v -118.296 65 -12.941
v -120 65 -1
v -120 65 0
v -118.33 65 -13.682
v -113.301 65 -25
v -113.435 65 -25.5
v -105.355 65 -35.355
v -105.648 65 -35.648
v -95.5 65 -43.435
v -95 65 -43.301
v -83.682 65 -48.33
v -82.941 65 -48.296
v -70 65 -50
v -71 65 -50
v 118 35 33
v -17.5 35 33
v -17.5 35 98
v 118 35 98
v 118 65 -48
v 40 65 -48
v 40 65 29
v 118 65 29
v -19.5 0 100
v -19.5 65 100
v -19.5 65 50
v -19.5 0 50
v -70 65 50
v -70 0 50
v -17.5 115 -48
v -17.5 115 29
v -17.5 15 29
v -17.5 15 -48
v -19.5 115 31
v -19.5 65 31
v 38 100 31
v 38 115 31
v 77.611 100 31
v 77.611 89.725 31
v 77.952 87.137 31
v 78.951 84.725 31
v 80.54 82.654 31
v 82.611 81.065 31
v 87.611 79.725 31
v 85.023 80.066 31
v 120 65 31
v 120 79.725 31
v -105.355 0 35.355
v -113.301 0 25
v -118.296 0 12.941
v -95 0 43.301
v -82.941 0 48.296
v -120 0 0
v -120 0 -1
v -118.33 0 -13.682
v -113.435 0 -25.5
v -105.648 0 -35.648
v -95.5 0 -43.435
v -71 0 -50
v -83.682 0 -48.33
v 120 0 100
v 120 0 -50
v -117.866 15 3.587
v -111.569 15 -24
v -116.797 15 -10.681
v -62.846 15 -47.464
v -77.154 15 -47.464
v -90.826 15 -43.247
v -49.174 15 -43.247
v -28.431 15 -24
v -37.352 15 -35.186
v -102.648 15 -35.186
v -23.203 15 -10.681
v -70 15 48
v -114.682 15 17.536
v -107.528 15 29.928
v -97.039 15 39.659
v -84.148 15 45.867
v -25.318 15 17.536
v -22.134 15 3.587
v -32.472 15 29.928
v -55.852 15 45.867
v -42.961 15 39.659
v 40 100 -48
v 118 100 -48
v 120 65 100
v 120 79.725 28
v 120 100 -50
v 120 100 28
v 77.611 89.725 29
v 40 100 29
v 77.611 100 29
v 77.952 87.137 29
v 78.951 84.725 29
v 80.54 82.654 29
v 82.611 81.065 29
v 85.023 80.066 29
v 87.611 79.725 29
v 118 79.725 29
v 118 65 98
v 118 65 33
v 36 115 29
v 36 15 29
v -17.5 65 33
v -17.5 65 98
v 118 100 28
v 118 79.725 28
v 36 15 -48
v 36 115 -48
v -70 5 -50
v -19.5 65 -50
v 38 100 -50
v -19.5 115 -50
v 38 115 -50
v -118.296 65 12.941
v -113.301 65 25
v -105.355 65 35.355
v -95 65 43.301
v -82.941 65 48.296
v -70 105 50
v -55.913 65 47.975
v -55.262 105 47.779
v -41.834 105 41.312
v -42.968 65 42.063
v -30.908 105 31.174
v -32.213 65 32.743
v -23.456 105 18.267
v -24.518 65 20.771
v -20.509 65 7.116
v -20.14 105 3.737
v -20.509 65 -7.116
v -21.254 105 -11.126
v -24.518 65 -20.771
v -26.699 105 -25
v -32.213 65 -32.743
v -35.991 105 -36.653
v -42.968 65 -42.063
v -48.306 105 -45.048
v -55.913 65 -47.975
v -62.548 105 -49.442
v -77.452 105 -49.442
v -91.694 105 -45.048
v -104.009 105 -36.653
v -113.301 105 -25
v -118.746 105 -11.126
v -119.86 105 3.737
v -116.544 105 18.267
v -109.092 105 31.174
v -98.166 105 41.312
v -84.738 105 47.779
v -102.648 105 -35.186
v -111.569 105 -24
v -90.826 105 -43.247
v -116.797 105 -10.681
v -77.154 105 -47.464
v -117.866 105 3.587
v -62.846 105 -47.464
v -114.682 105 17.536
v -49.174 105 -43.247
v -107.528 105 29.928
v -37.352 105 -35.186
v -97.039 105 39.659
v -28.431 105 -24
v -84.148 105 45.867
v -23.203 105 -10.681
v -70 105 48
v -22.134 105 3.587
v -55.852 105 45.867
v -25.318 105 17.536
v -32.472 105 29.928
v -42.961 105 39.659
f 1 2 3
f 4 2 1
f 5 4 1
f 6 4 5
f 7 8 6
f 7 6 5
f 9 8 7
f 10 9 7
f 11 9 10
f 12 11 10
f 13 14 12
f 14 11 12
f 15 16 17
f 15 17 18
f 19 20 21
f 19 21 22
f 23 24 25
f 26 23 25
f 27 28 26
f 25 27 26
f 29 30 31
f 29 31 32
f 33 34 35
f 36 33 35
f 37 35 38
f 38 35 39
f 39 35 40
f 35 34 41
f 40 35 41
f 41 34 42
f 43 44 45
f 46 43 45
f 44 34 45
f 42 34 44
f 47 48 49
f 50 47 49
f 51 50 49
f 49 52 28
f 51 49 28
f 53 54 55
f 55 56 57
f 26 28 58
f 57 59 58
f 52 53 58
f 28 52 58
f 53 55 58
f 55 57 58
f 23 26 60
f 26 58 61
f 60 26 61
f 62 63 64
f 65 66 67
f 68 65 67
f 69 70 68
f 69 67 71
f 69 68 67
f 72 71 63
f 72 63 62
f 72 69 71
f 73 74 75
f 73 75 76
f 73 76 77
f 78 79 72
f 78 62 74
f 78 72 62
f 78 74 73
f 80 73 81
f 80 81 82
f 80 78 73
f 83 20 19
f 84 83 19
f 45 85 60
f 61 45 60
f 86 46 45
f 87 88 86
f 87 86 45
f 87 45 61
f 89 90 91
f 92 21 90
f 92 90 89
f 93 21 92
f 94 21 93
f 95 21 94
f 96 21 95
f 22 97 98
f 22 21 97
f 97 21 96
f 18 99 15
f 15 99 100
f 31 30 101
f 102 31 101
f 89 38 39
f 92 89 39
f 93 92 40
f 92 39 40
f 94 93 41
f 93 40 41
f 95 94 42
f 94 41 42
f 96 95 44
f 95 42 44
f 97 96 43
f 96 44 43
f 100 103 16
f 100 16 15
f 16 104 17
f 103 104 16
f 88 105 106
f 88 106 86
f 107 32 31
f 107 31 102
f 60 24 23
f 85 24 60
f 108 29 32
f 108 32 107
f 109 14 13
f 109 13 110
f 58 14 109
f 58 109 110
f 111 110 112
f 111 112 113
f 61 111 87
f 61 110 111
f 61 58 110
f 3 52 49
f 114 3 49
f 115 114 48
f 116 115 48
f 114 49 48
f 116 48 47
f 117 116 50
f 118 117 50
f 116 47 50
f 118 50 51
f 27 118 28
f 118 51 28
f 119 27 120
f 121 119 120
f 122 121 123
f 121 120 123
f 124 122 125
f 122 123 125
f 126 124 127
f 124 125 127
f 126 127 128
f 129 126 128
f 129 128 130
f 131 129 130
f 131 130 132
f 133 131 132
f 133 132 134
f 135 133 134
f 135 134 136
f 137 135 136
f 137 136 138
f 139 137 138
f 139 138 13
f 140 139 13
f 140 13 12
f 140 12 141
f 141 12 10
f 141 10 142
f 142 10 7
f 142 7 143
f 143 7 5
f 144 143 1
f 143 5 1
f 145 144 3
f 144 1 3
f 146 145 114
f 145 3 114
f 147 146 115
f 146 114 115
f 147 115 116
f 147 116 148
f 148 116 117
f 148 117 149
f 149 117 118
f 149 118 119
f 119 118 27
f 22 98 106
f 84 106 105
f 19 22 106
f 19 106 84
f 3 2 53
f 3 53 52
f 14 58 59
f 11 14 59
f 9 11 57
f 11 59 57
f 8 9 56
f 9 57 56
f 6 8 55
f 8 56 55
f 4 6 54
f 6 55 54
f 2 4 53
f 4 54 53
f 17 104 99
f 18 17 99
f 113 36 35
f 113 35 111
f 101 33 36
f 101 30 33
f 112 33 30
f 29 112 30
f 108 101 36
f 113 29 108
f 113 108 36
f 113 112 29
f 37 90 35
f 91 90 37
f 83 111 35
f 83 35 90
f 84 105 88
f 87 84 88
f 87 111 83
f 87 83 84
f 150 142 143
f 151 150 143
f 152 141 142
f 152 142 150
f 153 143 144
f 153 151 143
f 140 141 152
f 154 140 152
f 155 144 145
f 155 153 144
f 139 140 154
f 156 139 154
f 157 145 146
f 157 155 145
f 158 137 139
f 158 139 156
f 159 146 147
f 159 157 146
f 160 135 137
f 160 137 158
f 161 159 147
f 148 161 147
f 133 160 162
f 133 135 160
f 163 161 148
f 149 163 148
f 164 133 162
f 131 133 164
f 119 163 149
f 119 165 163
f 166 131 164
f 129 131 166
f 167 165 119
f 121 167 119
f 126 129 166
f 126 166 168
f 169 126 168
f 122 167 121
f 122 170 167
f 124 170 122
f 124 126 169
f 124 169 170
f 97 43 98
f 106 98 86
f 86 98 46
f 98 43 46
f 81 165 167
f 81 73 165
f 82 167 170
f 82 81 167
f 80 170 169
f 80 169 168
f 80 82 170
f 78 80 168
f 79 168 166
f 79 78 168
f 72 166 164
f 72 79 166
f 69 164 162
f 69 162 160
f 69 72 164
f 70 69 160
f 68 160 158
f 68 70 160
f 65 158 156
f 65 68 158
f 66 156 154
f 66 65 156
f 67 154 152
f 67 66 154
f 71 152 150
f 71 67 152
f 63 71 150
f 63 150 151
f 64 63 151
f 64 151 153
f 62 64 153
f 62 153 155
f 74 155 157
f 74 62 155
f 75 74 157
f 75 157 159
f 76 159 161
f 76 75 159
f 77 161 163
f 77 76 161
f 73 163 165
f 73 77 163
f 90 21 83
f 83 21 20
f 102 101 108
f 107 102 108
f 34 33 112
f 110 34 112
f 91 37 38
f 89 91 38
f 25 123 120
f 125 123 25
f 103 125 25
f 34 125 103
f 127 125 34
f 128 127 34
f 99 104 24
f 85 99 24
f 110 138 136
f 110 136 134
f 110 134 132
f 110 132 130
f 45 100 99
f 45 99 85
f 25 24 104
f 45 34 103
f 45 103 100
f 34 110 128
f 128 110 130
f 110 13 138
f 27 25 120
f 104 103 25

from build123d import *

# Parameters (mm, degrees)
BOSS_EXTRUDE1_DEPTH = 65
BOSS_EXTRUDE3_START = -60
SKETCH2_R           = 48
BOSS_EXTRUDE3_DEPTH = 100
CUT_EXTRUDE1_START  = -50
SKETCH2_6_R         = 48
CUT_EXTRUDE1_DEPTH  = 50
BOSS_EXTRUDE6_START = -50
SKETCH2_9_W         = 57.5
SKETCH2_9_H         = 81
SKETCH2_9_W_2       = 53.5
SKETCH2_9_H_2       = 77
BOSS_EXTRUDE6_DEPTH = 100
SKETCH2_10_W        = 53.5
SKETCH2_10_H        = 77
CUT_EXTRUDE2_DEPTH  = 50
SKETCH2_11_W        = 82
SKETCH2_11_H        = 81
SKETCH2_11_W_2      = 78
SKETCH2_11_H_2      = 77
BOSS_EXTRUDE7_DEPTH = 35
CUT_EXTRUDE4_DEPTH  = 3
SKETCH10_W          = 139.5
SKETCH10_H          = 50
BOSS_EXTRUDE9_DEPTH = 65
SKETCH10_3_W        = 139.5
SKETCH10_3_H        = 50
CUT_EXTRUDE5_DEPTH  = 20
SKETCH7_W           = 139.5
SKETCH7_H           = 50
BOSS_EXTRUDE8_DEPTH = 65
SKETCH8_W           = 135.5
SKETCH8_H           = 65
CUT_EXTRUDE6_DEPTH  = 30


with BuildPart() as part:
    # Sketch1 → Boss-Extrude1 (new body)
    with BuildSketch(Plane(origin=(0, 0, 0), x_dir=(1, 0, 0), z_dir=(0, 1, 0))):
        with BuildLine():
            Line((-70, -50), (120, -50))
            Line((120, -50), (120, 50))
            Line((120, 50), (-71, 50))
            ThreePointArc((-71, 50), (-105.648232278, 35.648232278), (-120, 1))
            Line((-120, 1), (-120, 0))
            ThreePointArc((-120, 0), (-105.355339059, -35.355339059), (-70, -50))
        make_face()
    extrude(amount=BOSS_EXTRUDE1_DEPTH)

    # Sketch2 → Boss-Extrude3 (add)
    with BuildSketch(Plane(origin=(0, 65, 0), x_dir=(1, 0, 0), z_dir=(0, 1, 0)).offset(BOSS_EXTRUDE3_START)):
        with BuildLine():
            ThreePointArc((-70, -50), (-34.644660941, -35.355339059), (-20, 0))
            ThreePointArc((-20, 0), (-70, 50), (-120, 0))
            ThreePointArc((-120, 0), (-105.355339059, -35.355339059), (-70, -50))
        make_face()
        with Locations((-70, 0)):
            Circle(SKETCH2_R, mode=Mode.SUBTRACT)
    extrude(amount=BOSS_EXTRUDE3_DEPTH)

    # Sketch2<6> → Cut-Extrude1 (cut)
    with BuildSketch(Plane(origin=(0, 65, 0), x_dir=(1, 0, 0), z_dir=(0, 1, 0)).offset(CUT_EXTRUDE1_START)):
        with Locations((-70, 0)):
            Circle(SKETCH2_6_R)
    extrude(amount=CUT_EXTRUDE1_DEPTH, mode=Mode.SUBTRACT)

    # Sketch2<9> → Boss-Extrude6 (add)
    with BuildSketch(Plane(origin=(0, 65, 0), x_dir=(1, 0, 0), z_dir=(0, 1, 0)).offset(BOSS_EXTRUDE6_START)):
        with Locations((9.25, 9.5)):
            Rectangle(SKETCH2_9_W, SKETCH2_9_H)
        with Locations((9.25, 9.5)):
            Rectangle(SKETCH2_9_W_2, SKETCH2_9_H_2, mode=Mode.SUBTRACT)
    extrude(amount=BOSS_EXTRUDE6_DEPTH)

    # Sketch2<10> → Cut-Extrude2 (cut)
    with BuildSketch(Plane(origin=(0, 65, 0), x_dir=(1, 0, 0), z_dir=(0, 1, 0))):
        with Locations((9.25, 9.5)):
            Rectangle(SKETCH2_10_W, SKETCH2_10_H)
    extrude(amount=-CUT_EXTRUDE2_DEPTH, mode=Mode.SUBTRACT)

    # Sketch2<11> → Boss-Extrude7 (add)
    with BuildSketch(Plane(origin=(0, 65, 0), x_dir=(1, 0, 0), z_dir=(0, 1, 0))):
        with Locations((79, 9.5)):
            Rectangle(SKETCH2_11_W, SKETCH2_11_H)
        with Locations((79, 9.5)):
            Rectangle(SKETCH2_11_W_2, SKETCH2_11_H_2, mode=Mode.SUBTRACT)
    extrude(amount=BOSS_EXTRUDE7_DEPTH)

    # Sketch5 → Cut-Extrude4 (cut)
    with BuildSketch(Plane.XY.offset(31)):
        with BuildLine():
            Line((77.611486798, 100), (77.611486798, 89.725450473))
            ThreePointArc((77.611486798, 89.725450473), (80.540418986, 82.654382661), (87.611486798, 79.725450473))
            Line((87.611486798, 79.725450473), (120, 79.725450473))
            Line((120, 79.725450473), (120, 100))
            Line((120, 100), (77.611486798, 100))
        make_face()
    extrude(amount=-CUT_EXTRUDE4_DEPTH, mode=Mode.SUBTRACT)

    # Sketch10 → Boss-Extrude9 (add)
    with BuildSketch(Plane(origin=(0, 65, 0), x_dir=(1, 0, 0), z_dir=(0, 1, 0))):
        with Locations((50.25, -75)):
            Rectangle(SKETCH10_W, SKETCH10_H)
    extrude(amount=-BOSS_EXTRUDE9_DEPTH)

    # Sketch10<3> → Cut-Extrude5 (cut)
    with BuildSketch(Plane(origin=(0, 65, 0), x_dir=(1, 0, 0), z_dir=(0, 1, 0))):
        with Locations((50.25, -75)):
            Rectangle(SKETCH10_3_W, SKETCH10_3_H)
    extrude(amount=-CUT_EXTRUDE5_DEPTH, mode=Mode.SUBTRACT)

    # Sketch7 → Boss-Extrude8 (add)
    with BuildSketch(Plane(origin=(0, 65, 0), x_dir=(1, 0, 0), z_dir=(0, 1, 0))):
        with Locations((50.25, -75)):
            Rectangle(SKETCH7_W, SKETCH7_H)
    extrude(amount=-BOSS_EXTRUDE8_DEPTH)

    # Sketch8 → Cut-Extrude6 (cut)
    with BuildSketch(Plane(origin=(0, 65, 0), x_dir=(1, 0, 0), z_dir=(0, 1, 0))):
        with Locations((50.25, -65.5)):
            Rectangle(SKETCH8_W, SKETCH8_H)
    extrude(amount=-CUT_EXTRUDE6_DEPTH, mode=Mode.SUBTRACT)


solid = part.part
